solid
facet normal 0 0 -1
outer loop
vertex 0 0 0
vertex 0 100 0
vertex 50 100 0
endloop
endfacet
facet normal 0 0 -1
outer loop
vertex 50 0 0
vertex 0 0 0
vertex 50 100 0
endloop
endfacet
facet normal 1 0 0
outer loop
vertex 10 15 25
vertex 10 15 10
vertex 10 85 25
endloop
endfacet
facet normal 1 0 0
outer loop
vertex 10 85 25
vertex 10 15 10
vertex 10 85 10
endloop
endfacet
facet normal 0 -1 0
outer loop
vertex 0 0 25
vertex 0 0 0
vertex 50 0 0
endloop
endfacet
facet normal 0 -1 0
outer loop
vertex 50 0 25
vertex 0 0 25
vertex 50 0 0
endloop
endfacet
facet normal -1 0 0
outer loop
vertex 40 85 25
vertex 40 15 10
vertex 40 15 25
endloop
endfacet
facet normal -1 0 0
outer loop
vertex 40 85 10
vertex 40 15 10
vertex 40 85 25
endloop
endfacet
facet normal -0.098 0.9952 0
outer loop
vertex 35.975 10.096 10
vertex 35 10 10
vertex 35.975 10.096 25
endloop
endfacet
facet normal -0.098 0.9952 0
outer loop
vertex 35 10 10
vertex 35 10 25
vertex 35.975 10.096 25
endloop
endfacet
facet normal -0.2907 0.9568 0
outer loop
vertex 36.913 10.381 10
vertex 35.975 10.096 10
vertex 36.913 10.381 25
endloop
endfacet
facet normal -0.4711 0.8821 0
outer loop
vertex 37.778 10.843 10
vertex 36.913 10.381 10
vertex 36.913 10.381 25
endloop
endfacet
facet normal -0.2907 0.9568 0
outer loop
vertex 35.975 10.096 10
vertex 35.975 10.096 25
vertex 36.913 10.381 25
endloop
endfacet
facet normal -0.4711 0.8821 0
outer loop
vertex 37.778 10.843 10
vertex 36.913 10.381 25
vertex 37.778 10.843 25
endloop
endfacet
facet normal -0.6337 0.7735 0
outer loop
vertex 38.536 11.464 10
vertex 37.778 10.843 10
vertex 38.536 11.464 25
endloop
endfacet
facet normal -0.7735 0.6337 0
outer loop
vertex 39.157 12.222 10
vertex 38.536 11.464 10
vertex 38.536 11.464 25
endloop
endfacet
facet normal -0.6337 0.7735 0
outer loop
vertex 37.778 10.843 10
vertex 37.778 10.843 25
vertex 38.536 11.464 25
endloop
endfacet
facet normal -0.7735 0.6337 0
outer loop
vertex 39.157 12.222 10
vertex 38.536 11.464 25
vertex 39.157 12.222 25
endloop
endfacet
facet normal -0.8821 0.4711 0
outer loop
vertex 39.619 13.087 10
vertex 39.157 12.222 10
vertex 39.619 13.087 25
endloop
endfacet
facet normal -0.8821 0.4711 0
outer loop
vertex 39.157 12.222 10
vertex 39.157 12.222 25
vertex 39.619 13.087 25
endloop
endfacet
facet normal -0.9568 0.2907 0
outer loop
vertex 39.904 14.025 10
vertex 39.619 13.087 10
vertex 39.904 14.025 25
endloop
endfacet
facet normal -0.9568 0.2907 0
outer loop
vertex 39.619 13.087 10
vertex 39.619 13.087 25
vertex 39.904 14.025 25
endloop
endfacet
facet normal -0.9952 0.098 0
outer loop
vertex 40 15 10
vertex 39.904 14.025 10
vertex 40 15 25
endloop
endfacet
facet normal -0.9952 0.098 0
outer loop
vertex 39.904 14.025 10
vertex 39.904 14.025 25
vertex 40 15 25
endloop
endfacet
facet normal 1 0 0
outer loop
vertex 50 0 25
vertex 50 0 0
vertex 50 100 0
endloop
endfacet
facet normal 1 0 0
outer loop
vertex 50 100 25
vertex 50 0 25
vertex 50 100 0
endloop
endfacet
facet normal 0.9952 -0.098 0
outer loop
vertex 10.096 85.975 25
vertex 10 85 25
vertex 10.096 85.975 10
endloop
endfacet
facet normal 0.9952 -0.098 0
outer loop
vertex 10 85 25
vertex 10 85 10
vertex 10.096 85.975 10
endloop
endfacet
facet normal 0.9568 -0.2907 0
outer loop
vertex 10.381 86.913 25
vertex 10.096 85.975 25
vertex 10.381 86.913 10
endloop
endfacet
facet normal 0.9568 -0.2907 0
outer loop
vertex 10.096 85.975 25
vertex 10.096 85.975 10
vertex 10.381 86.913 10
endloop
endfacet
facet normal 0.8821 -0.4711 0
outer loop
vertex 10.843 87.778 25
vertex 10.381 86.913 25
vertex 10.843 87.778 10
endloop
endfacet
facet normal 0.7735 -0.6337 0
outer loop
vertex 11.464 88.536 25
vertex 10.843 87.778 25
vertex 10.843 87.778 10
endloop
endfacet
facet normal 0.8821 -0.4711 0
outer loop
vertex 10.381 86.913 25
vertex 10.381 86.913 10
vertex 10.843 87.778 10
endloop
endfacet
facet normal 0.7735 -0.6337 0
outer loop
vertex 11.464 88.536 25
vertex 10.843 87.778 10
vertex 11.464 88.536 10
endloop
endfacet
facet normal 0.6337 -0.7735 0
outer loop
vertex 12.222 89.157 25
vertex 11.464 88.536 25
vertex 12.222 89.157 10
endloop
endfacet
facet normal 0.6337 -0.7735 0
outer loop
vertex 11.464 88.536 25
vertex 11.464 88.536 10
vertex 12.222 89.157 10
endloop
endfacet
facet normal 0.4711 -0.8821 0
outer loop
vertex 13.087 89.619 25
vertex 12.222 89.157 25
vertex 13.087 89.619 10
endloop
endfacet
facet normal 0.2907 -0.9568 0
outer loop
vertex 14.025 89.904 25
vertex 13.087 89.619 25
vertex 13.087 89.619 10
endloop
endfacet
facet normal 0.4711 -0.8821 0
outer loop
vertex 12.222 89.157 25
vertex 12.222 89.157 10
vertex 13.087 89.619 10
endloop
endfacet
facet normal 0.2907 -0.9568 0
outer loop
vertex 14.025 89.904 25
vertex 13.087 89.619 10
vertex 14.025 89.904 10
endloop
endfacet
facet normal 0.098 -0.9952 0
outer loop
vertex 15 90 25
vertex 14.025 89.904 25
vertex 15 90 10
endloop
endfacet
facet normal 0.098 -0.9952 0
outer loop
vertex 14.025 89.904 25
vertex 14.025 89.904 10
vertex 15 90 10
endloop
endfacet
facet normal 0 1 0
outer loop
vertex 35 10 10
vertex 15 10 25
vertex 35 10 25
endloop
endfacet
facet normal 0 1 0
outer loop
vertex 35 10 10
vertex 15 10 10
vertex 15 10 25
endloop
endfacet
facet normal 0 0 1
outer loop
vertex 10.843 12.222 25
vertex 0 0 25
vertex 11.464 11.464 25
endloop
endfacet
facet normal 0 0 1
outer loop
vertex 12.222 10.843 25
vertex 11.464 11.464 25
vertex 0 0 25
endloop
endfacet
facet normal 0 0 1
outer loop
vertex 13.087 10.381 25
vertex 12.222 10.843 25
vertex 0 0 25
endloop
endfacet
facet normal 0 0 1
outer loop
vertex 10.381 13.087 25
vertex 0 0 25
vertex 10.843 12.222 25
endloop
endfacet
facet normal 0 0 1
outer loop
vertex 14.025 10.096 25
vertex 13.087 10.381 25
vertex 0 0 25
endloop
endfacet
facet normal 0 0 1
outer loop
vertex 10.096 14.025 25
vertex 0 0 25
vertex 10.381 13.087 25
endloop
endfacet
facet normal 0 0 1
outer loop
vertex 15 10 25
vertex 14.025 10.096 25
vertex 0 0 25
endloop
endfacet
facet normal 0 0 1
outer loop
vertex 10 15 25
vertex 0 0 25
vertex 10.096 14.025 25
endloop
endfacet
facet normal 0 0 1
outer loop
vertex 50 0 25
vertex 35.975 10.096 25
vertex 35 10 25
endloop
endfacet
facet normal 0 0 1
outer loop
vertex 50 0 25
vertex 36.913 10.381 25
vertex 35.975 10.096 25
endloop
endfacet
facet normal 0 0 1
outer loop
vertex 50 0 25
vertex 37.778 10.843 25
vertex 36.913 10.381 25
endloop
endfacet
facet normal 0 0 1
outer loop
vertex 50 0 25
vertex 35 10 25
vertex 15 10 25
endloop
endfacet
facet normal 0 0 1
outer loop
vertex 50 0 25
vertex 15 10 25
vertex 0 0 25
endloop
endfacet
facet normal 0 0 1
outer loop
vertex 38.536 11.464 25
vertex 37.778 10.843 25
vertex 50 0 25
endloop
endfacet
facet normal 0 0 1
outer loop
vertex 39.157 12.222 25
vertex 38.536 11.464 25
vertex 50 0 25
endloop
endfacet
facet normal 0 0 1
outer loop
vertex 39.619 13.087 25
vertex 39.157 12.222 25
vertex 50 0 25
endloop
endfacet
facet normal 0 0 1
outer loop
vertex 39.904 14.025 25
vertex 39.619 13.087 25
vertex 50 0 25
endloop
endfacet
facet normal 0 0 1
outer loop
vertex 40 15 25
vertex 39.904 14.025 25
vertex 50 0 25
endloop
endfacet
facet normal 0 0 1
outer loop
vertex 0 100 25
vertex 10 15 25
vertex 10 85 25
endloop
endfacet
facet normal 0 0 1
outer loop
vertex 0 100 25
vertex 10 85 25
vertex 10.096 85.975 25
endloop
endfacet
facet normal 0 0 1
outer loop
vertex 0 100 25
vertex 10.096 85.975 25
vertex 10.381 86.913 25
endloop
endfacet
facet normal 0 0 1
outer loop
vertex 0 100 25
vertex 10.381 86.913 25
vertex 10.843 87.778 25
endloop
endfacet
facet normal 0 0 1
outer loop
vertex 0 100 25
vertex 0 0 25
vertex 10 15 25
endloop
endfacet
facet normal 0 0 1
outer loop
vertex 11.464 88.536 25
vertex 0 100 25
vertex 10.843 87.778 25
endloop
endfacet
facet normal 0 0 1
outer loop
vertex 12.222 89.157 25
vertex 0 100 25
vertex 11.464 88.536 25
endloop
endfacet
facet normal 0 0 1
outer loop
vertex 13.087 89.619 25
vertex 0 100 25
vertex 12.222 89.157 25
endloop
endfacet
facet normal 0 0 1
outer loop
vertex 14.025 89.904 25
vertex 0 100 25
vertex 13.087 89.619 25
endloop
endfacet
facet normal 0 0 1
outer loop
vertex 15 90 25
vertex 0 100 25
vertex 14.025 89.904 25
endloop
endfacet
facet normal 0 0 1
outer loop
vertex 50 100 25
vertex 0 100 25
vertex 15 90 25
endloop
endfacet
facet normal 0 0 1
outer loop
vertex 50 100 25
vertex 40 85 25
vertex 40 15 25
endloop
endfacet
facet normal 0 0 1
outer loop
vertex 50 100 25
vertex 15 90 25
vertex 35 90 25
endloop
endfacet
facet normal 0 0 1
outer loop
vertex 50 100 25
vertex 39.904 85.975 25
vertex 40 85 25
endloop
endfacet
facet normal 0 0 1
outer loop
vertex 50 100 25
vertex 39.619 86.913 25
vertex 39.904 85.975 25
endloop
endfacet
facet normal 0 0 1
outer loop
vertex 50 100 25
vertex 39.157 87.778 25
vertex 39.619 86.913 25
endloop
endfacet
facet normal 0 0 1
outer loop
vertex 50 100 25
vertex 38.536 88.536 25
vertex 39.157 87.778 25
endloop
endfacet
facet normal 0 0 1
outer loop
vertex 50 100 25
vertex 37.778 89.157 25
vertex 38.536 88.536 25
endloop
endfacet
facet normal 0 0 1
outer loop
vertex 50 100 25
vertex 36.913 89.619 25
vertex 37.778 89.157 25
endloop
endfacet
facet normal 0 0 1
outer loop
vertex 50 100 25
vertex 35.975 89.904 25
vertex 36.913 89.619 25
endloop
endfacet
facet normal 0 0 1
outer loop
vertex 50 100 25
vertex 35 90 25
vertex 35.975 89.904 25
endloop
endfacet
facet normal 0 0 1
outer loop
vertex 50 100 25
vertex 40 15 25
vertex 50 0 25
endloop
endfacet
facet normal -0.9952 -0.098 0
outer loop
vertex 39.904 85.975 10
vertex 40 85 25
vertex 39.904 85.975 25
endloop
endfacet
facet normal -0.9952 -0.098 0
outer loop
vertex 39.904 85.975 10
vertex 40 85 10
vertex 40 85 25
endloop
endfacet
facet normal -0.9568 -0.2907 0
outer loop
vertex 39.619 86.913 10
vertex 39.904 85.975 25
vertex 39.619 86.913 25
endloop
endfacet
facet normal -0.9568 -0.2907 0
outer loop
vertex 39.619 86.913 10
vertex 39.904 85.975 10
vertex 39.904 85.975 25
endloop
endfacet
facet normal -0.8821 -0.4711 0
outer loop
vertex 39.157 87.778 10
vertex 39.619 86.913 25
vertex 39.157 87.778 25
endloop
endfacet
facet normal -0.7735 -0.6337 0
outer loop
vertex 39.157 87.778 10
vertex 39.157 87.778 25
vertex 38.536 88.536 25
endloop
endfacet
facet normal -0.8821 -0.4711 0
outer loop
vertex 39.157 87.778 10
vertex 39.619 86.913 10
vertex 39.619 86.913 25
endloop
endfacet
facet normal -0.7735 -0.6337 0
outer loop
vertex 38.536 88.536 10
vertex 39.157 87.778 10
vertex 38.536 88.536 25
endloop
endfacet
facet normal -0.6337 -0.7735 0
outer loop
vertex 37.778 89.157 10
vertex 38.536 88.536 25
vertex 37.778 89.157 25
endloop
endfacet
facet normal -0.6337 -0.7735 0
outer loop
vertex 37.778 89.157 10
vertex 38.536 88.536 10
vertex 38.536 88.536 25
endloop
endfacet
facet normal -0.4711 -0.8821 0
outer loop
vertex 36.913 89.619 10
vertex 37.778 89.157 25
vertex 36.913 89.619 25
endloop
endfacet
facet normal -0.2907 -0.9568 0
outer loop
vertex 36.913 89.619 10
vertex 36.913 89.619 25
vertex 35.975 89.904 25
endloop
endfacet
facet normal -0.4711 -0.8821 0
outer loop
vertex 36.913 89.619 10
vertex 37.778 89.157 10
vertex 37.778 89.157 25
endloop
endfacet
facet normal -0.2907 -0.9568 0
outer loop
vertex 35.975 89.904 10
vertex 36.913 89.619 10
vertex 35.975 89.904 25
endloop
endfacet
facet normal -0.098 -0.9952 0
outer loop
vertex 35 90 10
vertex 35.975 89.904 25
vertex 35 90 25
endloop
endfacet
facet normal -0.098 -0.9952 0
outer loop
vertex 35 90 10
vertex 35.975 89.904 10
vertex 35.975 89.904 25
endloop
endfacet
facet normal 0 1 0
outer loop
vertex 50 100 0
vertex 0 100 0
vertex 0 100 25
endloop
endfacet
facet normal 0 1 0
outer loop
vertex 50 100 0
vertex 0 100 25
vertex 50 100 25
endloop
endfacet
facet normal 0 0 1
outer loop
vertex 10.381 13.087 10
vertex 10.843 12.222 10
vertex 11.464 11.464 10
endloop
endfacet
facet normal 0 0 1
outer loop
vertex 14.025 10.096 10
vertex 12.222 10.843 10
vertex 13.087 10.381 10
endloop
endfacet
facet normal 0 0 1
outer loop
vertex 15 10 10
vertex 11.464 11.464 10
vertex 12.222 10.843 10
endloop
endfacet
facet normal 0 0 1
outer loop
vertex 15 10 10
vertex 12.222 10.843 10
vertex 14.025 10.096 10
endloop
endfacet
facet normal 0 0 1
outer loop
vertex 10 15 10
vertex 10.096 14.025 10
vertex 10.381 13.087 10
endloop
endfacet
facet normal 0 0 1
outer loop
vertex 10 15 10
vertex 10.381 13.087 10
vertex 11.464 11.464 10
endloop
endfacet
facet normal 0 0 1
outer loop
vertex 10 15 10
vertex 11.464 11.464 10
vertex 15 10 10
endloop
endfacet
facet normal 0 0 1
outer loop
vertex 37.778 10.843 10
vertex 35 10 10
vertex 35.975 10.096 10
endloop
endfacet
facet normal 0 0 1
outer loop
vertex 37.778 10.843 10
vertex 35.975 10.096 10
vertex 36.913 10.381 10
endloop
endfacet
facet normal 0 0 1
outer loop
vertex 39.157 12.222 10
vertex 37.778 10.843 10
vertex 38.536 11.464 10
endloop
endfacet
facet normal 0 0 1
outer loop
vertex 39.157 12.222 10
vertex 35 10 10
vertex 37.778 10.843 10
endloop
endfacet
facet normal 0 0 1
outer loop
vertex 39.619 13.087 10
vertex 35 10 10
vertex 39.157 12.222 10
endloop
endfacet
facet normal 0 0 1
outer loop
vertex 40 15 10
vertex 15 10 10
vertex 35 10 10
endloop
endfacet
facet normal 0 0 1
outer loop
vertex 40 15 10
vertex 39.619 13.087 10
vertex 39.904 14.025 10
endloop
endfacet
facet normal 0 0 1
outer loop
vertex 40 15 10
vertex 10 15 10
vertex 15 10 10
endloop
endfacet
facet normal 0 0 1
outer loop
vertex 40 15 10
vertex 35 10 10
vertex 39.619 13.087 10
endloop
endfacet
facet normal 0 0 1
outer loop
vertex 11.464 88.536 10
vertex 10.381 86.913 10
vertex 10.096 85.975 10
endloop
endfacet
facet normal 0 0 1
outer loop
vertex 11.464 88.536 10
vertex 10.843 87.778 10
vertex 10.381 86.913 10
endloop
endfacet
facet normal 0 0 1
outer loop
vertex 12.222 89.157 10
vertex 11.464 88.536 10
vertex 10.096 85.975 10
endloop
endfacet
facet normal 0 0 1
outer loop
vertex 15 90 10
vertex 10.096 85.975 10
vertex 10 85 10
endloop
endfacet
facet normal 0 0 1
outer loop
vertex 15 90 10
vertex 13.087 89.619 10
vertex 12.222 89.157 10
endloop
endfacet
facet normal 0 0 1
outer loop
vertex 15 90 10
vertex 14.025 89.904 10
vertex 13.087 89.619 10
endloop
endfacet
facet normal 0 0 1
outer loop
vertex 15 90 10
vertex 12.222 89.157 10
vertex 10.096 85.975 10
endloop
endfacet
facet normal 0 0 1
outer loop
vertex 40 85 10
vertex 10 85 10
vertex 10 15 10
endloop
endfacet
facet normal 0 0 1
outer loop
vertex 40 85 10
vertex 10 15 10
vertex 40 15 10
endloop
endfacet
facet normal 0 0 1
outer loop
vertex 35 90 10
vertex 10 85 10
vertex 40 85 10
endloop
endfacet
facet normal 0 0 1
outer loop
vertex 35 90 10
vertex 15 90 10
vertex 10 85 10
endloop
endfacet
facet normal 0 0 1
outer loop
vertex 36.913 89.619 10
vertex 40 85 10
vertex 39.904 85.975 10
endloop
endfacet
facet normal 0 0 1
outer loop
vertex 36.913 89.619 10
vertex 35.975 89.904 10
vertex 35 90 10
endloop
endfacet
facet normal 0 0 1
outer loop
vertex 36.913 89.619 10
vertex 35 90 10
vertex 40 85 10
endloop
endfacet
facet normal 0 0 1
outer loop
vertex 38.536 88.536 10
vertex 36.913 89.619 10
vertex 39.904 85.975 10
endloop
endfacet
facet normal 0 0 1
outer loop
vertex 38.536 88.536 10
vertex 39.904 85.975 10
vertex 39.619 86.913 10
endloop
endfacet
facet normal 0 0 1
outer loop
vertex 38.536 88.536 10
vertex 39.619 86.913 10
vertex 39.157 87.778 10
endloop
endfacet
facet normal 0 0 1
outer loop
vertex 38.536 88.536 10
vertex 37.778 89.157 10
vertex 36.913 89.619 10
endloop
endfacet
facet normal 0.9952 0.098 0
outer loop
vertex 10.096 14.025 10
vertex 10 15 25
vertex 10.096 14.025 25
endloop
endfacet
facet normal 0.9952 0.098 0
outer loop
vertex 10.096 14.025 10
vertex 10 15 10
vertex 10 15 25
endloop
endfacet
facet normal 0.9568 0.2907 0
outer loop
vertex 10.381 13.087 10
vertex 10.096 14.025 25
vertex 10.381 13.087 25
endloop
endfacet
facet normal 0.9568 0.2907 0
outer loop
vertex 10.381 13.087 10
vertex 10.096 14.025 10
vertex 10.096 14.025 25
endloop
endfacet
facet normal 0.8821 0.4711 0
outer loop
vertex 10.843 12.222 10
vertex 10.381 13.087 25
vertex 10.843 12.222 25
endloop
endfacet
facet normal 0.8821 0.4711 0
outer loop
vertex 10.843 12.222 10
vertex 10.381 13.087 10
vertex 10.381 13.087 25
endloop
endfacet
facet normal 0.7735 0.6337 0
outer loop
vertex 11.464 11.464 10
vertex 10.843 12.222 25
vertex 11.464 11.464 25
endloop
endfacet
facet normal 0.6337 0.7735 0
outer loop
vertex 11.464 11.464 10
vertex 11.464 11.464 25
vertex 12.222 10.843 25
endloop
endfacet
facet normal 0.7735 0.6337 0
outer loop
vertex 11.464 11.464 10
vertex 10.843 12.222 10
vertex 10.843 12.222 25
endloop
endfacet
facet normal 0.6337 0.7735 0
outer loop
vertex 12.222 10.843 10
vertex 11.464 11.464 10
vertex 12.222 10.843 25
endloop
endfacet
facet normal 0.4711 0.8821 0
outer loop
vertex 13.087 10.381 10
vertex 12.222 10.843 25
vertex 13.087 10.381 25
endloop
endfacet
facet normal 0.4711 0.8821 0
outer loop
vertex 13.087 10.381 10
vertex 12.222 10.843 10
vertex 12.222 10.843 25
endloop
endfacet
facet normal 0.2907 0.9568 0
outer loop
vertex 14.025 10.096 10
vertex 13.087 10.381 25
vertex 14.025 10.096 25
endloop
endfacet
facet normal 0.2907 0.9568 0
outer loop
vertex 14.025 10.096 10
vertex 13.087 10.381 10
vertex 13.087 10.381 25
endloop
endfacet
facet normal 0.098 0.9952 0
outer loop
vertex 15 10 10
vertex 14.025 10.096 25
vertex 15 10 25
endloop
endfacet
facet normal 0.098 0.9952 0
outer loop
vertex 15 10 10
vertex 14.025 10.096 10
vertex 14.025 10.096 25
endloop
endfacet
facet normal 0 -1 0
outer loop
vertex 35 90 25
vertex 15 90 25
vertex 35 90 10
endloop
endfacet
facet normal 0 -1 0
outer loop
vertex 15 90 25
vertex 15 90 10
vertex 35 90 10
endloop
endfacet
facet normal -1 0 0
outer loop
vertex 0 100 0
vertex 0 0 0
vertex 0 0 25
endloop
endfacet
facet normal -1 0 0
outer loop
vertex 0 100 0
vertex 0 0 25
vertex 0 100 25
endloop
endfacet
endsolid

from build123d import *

# Parameters (mm, degrees)
F0_W     = 50
F0_H     = 100
F1_DEPTH = 25
F2_T     = -10
F3_R     = 5


with BuildPart() as f1:
    # F0 (on Top) → F1 (new body)
    with BuildSketch(Plane.XY):
        with Locations((25, 50)):
            Rectangle(F0_W, F0_H)
    extrude(amount=F1_DEPTH)

    # F2
    f2_openings = [f1.faces().sort_by_distance(p)[0] for p in [
        (25, 50, 25),
    ]]
    offset(amount=F2_T, openings=f2_openings)

    # F3
    f3_edges = [f1.edges().sort_by_distance(p)[0] for p in [
        (10, 90, 17.5),
        (40, 90, 17.5),
        (40, 10, 17.5),
        (10, 10, 17.5),
    ]]
    fillet(f3_edges, radius=F3_R)


solid = f1.part
